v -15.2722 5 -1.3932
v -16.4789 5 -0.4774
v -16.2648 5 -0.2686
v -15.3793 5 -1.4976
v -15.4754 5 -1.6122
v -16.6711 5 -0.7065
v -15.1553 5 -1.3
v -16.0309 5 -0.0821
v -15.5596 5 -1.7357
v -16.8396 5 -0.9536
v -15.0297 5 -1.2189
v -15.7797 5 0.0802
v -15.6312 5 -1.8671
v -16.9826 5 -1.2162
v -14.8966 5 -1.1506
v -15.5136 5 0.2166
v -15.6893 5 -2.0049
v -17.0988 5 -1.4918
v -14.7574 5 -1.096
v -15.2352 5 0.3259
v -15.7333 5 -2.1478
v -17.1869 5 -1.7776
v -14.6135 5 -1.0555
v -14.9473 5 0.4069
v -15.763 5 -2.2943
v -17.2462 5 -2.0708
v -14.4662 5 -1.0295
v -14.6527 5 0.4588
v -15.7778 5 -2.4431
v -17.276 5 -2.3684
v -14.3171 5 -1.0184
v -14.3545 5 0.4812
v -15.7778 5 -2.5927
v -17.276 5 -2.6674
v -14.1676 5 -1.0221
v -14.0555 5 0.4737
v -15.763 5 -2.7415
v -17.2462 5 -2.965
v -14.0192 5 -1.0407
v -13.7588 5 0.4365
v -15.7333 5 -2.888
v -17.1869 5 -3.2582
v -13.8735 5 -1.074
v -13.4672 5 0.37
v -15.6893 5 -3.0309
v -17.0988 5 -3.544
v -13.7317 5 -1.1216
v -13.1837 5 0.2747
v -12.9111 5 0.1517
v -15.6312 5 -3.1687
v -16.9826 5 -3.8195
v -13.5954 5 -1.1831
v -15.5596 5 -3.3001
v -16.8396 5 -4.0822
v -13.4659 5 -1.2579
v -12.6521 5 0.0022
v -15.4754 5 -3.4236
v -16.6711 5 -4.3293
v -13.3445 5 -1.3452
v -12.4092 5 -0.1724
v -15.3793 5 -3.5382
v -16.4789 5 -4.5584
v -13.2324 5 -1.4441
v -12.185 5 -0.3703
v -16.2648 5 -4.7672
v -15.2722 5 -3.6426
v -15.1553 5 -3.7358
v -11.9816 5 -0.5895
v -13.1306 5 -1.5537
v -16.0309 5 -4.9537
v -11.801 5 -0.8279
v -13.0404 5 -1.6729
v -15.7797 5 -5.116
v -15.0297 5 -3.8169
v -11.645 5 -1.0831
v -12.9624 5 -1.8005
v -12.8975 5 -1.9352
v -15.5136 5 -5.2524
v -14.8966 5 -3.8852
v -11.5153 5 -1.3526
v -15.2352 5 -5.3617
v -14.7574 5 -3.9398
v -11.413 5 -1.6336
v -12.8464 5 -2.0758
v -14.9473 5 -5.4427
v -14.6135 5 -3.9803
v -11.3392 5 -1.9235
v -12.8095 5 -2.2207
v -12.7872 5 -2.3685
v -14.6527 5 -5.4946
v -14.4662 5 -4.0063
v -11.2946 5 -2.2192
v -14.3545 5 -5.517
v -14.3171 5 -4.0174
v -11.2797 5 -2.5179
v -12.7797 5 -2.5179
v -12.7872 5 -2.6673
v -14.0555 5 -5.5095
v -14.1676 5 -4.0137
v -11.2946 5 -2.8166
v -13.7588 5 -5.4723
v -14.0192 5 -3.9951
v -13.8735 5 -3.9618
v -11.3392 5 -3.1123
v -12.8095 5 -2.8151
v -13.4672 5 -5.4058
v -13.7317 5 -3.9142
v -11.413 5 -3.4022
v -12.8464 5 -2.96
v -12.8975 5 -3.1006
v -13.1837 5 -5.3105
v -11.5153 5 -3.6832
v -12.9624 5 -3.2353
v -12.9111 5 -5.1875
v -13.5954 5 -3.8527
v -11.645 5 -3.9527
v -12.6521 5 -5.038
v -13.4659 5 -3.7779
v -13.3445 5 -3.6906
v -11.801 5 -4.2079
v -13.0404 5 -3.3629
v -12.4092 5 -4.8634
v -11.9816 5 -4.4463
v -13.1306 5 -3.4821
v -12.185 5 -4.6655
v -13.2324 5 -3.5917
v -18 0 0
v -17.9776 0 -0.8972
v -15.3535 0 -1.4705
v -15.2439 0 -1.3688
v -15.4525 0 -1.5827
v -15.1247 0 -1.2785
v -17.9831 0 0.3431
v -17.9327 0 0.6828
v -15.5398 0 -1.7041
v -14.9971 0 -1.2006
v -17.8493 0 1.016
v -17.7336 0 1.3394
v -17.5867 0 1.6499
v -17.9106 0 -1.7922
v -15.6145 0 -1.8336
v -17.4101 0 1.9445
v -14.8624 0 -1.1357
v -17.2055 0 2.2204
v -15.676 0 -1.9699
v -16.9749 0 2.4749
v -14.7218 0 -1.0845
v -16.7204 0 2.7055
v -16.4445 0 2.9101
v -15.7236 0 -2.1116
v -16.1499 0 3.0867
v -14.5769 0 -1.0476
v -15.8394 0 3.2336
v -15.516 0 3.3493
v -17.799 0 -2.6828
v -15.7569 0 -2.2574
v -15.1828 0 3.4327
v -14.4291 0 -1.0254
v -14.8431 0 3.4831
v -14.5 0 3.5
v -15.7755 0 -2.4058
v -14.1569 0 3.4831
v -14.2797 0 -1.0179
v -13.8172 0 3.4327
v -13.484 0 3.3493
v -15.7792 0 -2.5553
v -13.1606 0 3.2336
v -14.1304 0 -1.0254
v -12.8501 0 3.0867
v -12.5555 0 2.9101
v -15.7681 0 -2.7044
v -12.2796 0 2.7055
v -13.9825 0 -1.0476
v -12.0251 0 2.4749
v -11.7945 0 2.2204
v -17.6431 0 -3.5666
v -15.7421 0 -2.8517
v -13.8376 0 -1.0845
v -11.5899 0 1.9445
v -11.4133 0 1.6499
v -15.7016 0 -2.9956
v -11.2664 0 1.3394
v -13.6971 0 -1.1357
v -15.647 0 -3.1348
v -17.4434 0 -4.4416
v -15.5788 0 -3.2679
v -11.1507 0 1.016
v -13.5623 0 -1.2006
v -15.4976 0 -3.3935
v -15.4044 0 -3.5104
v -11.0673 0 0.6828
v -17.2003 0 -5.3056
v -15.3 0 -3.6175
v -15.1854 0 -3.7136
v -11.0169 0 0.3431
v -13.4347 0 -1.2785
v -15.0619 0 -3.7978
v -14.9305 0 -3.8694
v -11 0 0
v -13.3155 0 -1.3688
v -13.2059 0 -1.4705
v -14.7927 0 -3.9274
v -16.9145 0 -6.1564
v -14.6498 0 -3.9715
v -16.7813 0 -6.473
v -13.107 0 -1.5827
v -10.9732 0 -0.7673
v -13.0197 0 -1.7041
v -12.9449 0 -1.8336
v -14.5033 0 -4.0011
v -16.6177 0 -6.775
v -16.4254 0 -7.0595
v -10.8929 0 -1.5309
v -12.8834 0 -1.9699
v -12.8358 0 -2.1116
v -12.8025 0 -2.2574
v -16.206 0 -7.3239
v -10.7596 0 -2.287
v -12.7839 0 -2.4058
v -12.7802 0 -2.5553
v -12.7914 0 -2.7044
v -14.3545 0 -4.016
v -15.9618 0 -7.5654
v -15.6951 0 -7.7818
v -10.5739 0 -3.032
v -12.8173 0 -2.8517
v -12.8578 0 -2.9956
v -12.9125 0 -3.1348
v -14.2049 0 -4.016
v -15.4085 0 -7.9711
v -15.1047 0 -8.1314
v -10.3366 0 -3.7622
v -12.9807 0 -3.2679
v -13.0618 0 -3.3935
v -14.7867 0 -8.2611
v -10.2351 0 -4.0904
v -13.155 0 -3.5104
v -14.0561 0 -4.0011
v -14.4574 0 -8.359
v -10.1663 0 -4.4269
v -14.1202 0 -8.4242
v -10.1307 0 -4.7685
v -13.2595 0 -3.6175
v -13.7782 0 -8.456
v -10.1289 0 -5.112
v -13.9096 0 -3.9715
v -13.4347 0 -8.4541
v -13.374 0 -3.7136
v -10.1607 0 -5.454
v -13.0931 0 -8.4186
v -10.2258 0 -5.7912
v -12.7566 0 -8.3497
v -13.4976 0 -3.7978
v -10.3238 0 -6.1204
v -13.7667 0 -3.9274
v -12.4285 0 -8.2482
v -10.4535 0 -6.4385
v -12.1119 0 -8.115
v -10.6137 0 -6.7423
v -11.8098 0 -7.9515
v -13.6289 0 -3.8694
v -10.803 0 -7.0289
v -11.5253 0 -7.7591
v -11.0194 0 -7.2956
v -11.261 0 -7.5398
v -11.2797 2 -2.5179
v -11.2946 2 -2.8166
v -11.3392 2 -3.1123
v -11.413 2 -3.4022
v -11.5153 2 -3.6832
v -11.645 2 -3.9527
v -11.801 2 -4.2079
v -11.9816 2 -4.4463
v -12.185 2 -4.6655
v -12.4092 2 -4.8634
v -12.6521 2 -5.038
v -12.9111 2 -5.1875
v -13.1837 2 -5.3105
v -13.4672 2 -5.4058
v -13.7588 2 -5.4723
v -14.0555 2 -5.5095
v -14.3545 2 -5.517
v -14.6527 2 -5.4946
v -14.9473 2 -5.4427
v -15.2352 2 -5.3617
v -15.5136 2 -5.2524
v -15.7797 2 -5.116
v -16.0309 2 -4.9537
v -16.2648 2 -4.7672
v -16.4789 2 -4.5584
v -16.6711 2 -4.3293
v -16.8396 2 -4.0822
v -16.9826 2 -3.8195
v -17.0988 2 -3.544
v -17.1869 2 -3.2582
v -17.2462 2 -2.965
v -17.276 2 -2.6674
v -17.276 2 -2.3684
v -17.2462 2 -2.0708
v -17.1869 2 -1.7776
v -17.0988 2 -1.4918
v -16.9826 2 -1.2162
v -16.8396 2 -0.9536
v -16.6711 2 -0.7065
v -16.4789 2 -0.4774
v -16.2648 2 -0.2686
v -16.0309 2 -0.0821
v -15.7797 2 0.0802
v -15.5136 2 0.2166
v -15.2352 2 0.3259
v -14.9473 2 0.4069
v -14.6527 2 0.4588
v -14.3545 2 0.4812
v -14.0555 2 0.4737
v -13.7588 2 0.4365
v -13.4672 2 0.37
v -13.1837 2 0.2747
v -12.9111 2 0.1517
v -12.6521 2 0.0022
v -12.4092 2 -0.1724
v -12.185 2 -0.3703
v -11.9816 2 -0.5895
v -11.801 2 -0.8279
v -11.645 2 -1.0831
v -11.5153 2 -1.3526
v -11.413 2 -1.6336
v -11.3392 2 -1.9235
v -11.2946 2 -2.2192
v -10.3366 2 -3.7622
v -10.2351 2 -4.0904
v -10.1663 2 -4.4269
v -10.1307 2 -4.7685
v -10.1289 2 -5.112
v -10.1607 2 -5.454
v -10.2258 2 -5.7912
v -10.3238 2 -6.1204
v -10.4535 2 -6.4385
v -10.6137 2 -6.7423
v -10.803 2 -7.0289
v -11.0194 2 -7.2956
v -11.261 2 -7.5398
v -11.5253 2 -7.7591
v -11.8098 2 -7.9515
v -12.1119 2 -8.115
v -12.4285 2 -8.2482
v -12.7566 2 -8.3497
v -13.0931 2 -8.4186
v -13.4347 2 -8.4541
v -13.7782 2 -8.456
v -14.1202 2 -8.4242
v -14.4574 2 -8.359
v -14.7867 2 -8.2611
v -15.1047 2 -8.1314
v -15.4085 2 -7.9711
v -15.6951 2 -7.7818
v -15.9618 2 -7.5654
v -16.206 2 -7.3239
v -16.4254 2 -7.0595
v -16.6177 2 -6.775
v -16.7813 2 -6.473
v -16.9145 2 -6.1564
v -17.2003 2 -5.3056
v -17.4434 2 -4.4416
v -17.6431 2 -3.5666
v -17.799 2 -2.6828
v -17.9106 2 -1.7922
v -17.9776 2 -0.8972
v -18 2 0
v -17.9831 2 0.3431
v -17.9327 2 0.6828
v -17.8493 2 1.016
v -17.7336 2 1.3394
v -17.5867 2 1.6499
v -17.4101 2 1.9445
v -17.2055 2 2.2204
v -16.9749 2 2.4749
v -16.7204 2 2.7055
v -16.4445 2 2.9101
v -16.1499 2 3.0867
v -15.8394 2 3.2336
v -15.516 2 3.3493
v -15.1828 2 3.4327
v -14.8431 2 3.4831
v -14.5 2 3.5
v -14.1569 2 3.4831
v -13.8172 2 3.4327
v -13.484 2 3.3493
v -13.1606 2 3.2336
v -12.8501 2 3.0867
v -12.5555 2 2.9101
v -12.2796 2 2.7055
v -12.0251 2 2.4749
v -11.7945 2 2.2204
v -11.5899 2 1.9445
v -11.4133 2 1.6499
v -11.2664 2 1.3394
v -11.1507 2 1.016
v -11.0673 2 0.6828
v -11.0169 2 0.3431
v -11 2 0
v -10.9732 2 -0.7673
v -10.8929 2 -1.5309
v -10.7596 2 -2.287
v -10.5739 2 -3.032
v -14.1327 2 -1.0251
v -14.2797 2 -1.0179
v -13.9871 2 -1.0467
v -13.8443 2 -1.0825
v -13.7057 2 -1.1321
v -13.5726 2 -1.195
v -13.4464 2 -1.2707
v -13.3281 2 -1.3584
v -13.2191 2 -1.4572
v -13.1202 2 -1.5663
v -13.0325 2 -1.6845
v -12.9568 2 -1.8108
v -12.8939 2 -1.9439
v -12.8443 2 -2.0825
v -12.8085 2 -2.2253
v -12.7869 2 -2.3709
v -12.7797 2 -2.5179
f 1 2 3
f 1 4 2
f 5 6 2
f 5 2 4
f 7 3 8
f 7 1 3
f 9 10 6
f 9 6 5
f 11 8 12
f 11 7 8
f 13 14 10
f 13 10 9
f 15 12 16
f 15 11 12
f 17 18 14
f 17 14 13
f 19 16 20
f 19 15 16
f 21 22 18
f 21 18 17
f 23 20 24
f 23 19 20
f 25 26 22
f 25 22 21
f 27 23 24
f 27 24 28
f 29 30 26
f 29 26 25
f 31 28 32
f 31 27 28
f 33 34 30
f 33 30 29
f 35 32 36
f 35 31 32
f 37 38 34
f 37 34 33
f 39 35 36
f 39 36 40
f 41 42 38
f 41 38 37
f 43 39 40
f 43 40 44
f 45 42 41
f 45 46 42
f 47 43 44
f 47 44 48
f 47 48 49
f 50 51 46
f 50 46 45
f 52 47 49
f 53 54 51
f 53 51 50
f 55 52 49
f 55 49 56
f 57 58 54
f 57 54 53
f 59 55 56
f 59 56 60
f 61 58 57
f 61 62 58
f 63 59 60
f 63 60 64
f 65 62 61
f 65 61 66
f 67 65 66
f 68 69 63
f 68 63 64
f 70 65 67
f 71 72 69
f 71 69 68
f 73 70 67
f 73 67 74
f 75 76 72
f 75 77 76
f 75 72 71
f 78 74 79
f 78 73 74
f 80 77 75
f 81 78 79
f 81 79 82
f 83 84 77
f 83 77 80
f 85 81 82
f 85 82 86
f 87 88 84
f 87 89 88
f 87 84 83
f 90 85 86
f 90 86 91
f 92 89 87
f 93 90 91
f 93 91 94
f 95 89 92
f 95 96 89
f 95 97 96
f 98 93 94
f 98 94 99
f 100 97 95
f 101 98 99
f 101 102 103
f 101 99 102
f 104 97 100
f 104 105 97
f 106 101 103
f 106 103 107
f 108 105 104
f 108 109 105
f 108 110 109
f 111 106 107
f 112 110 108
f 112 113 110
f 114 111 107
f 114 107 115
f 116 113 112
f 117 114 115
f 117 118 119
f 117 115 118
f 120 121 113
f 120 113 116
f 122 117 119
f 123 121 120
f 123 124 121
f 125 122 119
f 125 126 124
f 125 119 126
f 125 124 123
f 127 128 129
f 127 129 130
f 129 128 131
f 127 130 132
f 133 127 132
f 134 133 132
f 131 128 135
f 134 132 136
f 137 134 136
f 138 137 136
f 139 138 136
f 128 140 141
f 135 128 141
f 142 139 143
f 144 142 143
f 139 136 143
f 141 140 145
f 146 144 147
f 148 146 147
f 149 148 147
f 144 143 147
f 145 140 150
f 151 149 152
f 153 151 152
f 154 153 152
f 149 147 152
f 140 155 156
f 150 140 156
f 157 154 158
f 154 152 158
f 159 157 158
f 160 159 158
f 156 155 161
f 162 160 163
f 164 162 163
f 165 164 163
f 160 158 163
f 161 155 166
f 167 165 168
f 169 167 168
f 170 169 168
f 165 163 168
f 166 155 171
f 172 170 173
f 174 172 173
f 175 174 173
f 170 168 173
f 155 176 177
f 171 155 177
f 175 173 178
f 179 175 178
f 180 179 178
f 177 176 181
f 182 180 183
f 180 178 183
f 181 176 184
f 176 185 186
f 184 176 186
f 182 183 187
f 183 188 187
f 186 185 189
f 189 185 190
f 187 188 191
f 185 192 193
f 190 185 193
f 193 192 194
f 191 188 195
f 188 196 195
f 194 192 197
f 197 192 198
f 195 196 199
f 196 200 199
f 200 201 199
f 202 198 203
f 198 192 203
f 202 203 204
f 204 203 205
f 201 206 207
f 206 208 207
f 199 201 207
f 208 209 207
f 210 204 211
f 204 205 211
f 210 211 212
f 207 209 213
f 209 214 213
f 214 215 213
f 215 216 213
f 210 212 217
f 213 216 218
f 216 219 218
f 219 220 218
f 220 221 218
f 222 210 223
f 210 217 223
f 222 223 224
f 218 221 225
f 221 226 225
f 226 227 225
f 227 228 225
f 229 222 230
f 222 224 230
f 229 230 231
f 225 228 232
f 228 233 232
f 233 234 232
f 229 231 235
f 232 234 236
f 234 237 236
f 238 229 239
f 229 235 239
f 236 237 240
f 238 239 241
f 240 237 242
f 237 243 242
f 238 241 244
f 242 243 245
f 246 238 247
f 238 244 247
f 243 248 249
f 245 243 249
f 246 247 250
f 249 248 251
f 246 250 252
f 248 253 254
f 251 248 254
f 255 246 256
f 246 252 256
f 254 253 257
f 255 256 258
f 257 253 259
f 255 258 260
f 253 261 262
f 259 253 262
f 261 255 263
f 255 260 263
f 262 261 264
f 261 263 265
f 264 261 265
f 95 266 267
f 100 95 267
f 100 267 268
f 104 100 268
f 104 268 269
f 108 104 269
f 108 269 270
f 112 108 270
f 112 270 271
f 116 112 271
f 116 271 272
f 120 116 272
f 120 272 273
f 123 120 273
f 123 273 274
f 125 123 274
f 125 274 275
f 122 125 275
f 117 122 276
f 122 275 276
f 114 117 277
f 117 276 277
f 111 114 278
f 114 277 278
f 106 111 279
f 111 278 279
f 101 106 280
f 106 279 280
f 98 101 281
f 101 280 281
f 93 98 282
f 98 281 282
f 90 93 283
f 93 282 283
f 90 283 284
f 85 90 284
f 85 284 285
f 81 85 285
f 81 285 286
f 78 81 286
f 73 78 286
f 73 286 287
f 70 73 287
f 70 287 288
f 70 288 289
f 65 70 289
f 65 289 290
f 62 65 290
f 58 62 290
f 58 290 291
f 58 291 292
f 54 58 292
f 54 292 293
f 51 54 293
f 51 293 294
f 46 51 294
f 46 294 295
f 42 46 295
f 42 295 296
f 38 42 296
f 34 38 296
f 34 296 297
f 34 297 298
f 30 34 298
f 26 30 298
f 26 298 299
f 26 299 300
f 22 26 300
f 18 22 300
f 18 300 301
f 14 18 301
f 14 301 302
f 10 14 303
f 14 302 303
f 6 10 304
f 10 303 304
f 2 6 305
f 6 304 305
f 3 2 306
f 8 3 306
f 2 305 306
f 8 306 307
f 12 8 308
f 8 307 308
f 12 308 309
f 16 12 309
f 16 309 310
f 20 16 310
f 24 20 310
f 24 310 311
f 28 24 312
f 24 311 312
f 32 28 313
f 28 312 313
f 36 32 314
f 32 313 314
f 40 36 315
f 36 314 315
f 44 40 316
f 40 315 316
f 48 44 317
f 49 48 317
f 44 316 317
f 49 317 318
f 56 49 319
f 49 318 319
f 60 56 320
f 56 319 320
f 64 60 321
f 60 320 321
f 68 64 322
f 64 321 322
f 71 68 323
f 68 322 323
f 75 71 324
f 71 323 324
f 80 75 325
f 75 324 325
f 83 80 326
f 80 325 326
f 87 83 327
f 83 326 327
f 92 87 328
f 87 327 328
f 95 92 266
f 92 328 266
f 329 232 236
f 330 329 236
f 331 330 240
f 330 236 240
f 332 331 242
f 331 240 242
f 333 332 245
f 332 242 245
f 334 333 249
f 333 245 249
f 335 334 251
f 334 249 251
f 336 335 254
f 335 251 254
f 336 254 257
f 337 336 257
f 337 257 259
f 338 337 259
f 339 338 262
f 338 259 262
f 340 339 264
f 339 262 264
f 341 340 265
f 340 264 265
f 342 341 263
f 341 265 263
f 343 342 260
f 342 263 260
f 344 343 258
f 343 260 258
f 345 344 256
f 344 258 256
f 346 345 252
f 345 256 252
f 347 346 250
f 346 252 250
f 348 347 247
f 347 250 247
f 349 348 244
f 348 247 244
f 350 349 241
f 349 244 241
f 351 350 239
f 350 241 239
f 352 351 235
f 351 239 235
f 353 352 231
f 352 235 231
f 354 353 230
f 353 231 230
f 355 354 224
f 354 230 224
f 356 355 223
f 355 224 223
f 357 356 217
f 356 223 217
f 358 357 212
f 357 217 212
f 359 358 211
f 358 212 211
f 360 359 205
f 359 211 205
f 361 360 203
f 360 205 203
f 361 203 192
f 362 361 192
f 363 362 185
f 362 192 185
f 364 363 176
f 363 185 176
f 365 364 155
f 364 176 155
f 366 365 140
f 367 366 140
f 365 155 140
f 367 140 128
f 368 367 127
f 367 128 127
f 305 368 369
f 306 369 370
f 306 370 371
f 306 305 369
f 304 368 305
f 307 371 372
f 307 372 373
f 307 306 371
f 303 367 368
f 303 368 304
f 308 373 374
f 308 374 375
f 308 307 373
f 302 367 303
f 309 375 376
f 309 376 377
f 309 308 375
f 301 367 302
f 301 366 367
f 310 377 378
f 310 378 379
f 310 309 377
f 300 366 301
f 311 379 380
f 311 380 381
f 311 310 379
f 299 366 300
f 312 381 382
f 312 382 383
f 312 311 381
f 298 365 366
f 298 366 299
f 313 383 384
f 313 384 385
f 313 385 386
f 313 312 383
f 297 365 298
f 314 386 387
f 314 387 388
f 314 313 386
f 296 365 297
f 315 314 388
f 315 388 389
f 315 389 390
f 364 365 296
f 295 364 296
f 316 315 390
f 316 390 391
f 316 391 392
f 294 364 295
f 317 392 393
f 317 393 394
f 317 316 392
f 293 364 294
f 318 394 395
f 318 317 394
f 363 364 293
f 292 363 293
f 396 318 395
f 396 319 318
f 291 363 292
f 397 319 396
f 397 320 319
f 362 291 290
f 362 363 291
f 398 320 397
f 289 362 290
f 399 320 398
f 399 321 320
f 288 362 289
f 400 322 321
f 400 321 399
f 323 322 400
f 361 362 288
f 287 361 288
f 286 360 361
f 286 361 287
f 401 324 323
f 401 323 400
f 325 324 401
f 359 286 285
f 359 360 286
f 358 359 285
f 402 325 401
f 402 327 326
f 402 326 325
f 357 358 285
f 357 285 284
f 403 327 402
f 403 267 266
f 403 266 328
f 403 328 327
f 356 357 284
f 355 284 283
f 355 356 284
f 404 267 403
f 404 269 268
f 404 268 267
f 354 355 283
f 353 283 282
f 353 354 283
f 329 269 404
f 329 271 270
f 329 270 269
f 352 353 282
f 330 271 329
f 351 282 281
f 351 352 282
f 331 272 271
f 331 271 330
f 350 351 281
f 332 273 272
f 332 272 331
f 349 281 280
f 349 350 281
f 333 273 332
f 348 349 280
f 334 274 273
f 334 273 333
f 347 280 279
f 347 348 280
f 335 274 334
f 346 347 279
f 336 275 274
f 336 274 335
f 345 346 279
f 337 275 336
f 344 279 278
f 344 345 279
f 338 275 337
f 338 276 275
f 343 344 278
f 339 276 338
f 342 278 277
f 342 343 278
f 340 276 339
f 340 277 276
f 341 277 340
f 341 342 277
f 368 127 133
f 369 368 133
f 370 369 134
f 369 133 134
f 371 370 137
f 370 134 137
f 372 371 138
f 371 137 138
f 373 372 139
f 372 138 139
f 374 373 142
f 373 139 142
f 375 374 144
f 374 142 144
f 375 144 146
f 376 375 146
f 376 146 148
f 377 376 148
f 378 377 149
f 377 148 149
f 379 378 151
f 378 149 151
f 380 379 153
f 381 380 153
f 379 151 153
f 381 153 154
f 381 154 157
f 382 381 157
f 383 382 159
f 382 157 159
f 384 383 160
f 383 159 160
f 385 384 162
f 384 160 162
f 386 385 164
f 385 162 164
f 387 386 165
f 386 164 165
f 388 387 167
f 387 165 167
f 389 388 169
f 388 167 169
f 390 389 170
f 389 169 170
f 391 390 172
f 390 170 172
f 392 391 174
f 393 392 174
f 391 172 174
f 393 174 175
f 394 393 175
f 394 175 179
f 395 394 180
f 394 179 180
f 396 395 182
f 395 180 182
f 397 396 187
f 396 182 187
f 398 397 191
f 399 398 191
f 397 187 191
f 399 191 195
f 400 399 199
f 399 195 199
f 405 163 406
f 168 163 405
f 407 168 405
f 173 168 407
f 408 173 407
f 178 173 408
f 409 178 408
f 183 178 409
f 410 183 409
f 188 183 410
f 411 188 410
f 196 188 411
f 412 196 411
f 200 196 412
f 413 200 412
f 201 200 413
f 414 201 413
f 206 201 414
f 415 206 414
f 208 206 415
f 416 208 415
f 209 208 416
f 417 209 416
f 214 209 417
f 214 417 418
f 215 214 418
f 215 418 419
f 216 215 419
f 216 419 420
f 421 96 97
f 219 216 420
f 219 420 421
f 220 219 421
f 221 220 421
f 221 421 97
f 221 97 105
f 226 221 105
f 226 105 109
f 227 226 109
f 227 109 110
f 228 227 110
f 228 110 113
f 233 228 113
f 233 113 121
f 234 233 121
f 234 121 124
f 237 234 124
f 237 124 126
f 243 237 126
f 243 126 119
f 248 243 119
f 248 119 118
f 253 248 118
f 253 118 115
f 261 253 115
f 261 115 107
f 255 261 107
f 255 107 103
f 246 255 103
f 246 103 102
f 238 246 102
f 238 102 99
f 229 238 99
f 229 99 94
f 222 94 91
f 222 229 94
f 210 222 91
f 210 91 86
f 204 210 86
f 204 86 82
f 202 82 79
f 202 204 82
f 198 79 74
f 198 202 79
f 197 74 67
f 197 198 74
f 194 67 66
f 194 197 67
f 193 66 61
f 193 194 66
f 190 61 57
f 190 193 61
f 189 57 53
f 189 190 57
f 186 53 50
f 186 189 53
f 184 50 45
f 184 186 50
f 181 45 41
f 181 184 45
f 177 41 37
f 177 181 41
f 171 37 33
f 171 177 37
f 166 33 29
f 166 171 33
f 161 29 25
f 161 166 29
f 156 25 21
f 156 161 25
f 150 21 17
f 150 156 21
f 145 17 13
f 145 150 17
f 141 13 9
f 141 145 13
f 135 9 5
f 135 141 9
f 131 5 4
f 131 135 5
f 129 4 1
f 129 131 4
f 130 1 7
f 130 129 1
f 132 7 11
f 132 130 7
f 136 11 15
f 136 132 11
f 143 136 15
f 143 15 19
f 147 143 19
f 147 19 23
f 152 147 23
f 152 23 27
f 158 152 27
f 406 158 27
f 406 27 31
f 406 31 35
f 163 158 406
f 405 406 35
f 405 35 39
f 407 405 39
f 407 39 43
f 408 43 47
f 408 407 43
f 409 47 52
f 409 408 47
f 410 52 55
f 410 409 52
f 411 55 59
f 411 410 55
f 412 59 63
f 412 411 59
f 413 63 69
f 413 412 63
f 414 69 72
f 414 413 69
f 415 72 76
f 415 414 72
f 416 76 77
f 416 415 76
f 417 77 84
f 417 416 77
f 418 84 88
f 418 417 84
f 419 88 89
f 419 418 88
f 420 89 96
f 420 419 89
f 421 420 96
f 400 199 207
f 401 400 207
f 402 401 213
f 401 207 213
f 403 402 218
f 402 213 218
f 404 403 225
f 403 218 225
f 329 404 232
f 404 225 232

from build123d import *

# Parameters (mm, degrees)
SKETCH_2_R        = 1.5
EXTRUDE_1_DEPTH   = 2
SKETCH_2_3_R      = 3
SKETCH_2_3_R_2    = 1.5
EXTRUDE_1_2_DEPTH = 5


with BuildPart() as part:
    # 草图2 → Extrude 1 (new body)
    with BuildSketch(Plane(origin=(0, 0, 0), x_dir=(1, 0, 0), z_dir=(0, 1, 0))):
        with BuildLine():
            ThreePointArc((-16.914467174, 6.15636258), (-17.726539554, 3.125667198), (-18, 0))
            ThreePointArc((-18, 0), (-14.5, -3.5), (-11, 0))
            ThreePointArc((-11, 0), (-10.832885283, 1.910129954), (-10.336618829, 3.762221577))
            ThreePointArc((-10.336618829, 3.762221577), (-12.4284725, 8.248216251), (-16.914467174, 6.15636258))
        make_face()
        with Locations(Location((-14.279712419, 2.517898576, 0), (0, 0, 270))):
            Circle(SKETCH_2_R, mode=Mode.SUBTRACT)
    extrude(amount=EXTRUDE_1_DEPTH)

    # 草图2<3> → Extrude 1 2 (add)
    with BuildSketch(Plane(origin=(0, 0, 0), x_dir=(1, 0, 0), z_dir=(0, 1, 0))):
        with Locations((-14.279712419, 2.517898576)):
            Circle(SKETCH_2_3_R)
        with Locations((-14.279712419, 2.517898576)):
            Circle(SKETCH_2_3_R_2, mode=Mode.SUBTRACT)
    extrude(amount=EXTRUDE_1_2_DEPTH)


solid = part.part
